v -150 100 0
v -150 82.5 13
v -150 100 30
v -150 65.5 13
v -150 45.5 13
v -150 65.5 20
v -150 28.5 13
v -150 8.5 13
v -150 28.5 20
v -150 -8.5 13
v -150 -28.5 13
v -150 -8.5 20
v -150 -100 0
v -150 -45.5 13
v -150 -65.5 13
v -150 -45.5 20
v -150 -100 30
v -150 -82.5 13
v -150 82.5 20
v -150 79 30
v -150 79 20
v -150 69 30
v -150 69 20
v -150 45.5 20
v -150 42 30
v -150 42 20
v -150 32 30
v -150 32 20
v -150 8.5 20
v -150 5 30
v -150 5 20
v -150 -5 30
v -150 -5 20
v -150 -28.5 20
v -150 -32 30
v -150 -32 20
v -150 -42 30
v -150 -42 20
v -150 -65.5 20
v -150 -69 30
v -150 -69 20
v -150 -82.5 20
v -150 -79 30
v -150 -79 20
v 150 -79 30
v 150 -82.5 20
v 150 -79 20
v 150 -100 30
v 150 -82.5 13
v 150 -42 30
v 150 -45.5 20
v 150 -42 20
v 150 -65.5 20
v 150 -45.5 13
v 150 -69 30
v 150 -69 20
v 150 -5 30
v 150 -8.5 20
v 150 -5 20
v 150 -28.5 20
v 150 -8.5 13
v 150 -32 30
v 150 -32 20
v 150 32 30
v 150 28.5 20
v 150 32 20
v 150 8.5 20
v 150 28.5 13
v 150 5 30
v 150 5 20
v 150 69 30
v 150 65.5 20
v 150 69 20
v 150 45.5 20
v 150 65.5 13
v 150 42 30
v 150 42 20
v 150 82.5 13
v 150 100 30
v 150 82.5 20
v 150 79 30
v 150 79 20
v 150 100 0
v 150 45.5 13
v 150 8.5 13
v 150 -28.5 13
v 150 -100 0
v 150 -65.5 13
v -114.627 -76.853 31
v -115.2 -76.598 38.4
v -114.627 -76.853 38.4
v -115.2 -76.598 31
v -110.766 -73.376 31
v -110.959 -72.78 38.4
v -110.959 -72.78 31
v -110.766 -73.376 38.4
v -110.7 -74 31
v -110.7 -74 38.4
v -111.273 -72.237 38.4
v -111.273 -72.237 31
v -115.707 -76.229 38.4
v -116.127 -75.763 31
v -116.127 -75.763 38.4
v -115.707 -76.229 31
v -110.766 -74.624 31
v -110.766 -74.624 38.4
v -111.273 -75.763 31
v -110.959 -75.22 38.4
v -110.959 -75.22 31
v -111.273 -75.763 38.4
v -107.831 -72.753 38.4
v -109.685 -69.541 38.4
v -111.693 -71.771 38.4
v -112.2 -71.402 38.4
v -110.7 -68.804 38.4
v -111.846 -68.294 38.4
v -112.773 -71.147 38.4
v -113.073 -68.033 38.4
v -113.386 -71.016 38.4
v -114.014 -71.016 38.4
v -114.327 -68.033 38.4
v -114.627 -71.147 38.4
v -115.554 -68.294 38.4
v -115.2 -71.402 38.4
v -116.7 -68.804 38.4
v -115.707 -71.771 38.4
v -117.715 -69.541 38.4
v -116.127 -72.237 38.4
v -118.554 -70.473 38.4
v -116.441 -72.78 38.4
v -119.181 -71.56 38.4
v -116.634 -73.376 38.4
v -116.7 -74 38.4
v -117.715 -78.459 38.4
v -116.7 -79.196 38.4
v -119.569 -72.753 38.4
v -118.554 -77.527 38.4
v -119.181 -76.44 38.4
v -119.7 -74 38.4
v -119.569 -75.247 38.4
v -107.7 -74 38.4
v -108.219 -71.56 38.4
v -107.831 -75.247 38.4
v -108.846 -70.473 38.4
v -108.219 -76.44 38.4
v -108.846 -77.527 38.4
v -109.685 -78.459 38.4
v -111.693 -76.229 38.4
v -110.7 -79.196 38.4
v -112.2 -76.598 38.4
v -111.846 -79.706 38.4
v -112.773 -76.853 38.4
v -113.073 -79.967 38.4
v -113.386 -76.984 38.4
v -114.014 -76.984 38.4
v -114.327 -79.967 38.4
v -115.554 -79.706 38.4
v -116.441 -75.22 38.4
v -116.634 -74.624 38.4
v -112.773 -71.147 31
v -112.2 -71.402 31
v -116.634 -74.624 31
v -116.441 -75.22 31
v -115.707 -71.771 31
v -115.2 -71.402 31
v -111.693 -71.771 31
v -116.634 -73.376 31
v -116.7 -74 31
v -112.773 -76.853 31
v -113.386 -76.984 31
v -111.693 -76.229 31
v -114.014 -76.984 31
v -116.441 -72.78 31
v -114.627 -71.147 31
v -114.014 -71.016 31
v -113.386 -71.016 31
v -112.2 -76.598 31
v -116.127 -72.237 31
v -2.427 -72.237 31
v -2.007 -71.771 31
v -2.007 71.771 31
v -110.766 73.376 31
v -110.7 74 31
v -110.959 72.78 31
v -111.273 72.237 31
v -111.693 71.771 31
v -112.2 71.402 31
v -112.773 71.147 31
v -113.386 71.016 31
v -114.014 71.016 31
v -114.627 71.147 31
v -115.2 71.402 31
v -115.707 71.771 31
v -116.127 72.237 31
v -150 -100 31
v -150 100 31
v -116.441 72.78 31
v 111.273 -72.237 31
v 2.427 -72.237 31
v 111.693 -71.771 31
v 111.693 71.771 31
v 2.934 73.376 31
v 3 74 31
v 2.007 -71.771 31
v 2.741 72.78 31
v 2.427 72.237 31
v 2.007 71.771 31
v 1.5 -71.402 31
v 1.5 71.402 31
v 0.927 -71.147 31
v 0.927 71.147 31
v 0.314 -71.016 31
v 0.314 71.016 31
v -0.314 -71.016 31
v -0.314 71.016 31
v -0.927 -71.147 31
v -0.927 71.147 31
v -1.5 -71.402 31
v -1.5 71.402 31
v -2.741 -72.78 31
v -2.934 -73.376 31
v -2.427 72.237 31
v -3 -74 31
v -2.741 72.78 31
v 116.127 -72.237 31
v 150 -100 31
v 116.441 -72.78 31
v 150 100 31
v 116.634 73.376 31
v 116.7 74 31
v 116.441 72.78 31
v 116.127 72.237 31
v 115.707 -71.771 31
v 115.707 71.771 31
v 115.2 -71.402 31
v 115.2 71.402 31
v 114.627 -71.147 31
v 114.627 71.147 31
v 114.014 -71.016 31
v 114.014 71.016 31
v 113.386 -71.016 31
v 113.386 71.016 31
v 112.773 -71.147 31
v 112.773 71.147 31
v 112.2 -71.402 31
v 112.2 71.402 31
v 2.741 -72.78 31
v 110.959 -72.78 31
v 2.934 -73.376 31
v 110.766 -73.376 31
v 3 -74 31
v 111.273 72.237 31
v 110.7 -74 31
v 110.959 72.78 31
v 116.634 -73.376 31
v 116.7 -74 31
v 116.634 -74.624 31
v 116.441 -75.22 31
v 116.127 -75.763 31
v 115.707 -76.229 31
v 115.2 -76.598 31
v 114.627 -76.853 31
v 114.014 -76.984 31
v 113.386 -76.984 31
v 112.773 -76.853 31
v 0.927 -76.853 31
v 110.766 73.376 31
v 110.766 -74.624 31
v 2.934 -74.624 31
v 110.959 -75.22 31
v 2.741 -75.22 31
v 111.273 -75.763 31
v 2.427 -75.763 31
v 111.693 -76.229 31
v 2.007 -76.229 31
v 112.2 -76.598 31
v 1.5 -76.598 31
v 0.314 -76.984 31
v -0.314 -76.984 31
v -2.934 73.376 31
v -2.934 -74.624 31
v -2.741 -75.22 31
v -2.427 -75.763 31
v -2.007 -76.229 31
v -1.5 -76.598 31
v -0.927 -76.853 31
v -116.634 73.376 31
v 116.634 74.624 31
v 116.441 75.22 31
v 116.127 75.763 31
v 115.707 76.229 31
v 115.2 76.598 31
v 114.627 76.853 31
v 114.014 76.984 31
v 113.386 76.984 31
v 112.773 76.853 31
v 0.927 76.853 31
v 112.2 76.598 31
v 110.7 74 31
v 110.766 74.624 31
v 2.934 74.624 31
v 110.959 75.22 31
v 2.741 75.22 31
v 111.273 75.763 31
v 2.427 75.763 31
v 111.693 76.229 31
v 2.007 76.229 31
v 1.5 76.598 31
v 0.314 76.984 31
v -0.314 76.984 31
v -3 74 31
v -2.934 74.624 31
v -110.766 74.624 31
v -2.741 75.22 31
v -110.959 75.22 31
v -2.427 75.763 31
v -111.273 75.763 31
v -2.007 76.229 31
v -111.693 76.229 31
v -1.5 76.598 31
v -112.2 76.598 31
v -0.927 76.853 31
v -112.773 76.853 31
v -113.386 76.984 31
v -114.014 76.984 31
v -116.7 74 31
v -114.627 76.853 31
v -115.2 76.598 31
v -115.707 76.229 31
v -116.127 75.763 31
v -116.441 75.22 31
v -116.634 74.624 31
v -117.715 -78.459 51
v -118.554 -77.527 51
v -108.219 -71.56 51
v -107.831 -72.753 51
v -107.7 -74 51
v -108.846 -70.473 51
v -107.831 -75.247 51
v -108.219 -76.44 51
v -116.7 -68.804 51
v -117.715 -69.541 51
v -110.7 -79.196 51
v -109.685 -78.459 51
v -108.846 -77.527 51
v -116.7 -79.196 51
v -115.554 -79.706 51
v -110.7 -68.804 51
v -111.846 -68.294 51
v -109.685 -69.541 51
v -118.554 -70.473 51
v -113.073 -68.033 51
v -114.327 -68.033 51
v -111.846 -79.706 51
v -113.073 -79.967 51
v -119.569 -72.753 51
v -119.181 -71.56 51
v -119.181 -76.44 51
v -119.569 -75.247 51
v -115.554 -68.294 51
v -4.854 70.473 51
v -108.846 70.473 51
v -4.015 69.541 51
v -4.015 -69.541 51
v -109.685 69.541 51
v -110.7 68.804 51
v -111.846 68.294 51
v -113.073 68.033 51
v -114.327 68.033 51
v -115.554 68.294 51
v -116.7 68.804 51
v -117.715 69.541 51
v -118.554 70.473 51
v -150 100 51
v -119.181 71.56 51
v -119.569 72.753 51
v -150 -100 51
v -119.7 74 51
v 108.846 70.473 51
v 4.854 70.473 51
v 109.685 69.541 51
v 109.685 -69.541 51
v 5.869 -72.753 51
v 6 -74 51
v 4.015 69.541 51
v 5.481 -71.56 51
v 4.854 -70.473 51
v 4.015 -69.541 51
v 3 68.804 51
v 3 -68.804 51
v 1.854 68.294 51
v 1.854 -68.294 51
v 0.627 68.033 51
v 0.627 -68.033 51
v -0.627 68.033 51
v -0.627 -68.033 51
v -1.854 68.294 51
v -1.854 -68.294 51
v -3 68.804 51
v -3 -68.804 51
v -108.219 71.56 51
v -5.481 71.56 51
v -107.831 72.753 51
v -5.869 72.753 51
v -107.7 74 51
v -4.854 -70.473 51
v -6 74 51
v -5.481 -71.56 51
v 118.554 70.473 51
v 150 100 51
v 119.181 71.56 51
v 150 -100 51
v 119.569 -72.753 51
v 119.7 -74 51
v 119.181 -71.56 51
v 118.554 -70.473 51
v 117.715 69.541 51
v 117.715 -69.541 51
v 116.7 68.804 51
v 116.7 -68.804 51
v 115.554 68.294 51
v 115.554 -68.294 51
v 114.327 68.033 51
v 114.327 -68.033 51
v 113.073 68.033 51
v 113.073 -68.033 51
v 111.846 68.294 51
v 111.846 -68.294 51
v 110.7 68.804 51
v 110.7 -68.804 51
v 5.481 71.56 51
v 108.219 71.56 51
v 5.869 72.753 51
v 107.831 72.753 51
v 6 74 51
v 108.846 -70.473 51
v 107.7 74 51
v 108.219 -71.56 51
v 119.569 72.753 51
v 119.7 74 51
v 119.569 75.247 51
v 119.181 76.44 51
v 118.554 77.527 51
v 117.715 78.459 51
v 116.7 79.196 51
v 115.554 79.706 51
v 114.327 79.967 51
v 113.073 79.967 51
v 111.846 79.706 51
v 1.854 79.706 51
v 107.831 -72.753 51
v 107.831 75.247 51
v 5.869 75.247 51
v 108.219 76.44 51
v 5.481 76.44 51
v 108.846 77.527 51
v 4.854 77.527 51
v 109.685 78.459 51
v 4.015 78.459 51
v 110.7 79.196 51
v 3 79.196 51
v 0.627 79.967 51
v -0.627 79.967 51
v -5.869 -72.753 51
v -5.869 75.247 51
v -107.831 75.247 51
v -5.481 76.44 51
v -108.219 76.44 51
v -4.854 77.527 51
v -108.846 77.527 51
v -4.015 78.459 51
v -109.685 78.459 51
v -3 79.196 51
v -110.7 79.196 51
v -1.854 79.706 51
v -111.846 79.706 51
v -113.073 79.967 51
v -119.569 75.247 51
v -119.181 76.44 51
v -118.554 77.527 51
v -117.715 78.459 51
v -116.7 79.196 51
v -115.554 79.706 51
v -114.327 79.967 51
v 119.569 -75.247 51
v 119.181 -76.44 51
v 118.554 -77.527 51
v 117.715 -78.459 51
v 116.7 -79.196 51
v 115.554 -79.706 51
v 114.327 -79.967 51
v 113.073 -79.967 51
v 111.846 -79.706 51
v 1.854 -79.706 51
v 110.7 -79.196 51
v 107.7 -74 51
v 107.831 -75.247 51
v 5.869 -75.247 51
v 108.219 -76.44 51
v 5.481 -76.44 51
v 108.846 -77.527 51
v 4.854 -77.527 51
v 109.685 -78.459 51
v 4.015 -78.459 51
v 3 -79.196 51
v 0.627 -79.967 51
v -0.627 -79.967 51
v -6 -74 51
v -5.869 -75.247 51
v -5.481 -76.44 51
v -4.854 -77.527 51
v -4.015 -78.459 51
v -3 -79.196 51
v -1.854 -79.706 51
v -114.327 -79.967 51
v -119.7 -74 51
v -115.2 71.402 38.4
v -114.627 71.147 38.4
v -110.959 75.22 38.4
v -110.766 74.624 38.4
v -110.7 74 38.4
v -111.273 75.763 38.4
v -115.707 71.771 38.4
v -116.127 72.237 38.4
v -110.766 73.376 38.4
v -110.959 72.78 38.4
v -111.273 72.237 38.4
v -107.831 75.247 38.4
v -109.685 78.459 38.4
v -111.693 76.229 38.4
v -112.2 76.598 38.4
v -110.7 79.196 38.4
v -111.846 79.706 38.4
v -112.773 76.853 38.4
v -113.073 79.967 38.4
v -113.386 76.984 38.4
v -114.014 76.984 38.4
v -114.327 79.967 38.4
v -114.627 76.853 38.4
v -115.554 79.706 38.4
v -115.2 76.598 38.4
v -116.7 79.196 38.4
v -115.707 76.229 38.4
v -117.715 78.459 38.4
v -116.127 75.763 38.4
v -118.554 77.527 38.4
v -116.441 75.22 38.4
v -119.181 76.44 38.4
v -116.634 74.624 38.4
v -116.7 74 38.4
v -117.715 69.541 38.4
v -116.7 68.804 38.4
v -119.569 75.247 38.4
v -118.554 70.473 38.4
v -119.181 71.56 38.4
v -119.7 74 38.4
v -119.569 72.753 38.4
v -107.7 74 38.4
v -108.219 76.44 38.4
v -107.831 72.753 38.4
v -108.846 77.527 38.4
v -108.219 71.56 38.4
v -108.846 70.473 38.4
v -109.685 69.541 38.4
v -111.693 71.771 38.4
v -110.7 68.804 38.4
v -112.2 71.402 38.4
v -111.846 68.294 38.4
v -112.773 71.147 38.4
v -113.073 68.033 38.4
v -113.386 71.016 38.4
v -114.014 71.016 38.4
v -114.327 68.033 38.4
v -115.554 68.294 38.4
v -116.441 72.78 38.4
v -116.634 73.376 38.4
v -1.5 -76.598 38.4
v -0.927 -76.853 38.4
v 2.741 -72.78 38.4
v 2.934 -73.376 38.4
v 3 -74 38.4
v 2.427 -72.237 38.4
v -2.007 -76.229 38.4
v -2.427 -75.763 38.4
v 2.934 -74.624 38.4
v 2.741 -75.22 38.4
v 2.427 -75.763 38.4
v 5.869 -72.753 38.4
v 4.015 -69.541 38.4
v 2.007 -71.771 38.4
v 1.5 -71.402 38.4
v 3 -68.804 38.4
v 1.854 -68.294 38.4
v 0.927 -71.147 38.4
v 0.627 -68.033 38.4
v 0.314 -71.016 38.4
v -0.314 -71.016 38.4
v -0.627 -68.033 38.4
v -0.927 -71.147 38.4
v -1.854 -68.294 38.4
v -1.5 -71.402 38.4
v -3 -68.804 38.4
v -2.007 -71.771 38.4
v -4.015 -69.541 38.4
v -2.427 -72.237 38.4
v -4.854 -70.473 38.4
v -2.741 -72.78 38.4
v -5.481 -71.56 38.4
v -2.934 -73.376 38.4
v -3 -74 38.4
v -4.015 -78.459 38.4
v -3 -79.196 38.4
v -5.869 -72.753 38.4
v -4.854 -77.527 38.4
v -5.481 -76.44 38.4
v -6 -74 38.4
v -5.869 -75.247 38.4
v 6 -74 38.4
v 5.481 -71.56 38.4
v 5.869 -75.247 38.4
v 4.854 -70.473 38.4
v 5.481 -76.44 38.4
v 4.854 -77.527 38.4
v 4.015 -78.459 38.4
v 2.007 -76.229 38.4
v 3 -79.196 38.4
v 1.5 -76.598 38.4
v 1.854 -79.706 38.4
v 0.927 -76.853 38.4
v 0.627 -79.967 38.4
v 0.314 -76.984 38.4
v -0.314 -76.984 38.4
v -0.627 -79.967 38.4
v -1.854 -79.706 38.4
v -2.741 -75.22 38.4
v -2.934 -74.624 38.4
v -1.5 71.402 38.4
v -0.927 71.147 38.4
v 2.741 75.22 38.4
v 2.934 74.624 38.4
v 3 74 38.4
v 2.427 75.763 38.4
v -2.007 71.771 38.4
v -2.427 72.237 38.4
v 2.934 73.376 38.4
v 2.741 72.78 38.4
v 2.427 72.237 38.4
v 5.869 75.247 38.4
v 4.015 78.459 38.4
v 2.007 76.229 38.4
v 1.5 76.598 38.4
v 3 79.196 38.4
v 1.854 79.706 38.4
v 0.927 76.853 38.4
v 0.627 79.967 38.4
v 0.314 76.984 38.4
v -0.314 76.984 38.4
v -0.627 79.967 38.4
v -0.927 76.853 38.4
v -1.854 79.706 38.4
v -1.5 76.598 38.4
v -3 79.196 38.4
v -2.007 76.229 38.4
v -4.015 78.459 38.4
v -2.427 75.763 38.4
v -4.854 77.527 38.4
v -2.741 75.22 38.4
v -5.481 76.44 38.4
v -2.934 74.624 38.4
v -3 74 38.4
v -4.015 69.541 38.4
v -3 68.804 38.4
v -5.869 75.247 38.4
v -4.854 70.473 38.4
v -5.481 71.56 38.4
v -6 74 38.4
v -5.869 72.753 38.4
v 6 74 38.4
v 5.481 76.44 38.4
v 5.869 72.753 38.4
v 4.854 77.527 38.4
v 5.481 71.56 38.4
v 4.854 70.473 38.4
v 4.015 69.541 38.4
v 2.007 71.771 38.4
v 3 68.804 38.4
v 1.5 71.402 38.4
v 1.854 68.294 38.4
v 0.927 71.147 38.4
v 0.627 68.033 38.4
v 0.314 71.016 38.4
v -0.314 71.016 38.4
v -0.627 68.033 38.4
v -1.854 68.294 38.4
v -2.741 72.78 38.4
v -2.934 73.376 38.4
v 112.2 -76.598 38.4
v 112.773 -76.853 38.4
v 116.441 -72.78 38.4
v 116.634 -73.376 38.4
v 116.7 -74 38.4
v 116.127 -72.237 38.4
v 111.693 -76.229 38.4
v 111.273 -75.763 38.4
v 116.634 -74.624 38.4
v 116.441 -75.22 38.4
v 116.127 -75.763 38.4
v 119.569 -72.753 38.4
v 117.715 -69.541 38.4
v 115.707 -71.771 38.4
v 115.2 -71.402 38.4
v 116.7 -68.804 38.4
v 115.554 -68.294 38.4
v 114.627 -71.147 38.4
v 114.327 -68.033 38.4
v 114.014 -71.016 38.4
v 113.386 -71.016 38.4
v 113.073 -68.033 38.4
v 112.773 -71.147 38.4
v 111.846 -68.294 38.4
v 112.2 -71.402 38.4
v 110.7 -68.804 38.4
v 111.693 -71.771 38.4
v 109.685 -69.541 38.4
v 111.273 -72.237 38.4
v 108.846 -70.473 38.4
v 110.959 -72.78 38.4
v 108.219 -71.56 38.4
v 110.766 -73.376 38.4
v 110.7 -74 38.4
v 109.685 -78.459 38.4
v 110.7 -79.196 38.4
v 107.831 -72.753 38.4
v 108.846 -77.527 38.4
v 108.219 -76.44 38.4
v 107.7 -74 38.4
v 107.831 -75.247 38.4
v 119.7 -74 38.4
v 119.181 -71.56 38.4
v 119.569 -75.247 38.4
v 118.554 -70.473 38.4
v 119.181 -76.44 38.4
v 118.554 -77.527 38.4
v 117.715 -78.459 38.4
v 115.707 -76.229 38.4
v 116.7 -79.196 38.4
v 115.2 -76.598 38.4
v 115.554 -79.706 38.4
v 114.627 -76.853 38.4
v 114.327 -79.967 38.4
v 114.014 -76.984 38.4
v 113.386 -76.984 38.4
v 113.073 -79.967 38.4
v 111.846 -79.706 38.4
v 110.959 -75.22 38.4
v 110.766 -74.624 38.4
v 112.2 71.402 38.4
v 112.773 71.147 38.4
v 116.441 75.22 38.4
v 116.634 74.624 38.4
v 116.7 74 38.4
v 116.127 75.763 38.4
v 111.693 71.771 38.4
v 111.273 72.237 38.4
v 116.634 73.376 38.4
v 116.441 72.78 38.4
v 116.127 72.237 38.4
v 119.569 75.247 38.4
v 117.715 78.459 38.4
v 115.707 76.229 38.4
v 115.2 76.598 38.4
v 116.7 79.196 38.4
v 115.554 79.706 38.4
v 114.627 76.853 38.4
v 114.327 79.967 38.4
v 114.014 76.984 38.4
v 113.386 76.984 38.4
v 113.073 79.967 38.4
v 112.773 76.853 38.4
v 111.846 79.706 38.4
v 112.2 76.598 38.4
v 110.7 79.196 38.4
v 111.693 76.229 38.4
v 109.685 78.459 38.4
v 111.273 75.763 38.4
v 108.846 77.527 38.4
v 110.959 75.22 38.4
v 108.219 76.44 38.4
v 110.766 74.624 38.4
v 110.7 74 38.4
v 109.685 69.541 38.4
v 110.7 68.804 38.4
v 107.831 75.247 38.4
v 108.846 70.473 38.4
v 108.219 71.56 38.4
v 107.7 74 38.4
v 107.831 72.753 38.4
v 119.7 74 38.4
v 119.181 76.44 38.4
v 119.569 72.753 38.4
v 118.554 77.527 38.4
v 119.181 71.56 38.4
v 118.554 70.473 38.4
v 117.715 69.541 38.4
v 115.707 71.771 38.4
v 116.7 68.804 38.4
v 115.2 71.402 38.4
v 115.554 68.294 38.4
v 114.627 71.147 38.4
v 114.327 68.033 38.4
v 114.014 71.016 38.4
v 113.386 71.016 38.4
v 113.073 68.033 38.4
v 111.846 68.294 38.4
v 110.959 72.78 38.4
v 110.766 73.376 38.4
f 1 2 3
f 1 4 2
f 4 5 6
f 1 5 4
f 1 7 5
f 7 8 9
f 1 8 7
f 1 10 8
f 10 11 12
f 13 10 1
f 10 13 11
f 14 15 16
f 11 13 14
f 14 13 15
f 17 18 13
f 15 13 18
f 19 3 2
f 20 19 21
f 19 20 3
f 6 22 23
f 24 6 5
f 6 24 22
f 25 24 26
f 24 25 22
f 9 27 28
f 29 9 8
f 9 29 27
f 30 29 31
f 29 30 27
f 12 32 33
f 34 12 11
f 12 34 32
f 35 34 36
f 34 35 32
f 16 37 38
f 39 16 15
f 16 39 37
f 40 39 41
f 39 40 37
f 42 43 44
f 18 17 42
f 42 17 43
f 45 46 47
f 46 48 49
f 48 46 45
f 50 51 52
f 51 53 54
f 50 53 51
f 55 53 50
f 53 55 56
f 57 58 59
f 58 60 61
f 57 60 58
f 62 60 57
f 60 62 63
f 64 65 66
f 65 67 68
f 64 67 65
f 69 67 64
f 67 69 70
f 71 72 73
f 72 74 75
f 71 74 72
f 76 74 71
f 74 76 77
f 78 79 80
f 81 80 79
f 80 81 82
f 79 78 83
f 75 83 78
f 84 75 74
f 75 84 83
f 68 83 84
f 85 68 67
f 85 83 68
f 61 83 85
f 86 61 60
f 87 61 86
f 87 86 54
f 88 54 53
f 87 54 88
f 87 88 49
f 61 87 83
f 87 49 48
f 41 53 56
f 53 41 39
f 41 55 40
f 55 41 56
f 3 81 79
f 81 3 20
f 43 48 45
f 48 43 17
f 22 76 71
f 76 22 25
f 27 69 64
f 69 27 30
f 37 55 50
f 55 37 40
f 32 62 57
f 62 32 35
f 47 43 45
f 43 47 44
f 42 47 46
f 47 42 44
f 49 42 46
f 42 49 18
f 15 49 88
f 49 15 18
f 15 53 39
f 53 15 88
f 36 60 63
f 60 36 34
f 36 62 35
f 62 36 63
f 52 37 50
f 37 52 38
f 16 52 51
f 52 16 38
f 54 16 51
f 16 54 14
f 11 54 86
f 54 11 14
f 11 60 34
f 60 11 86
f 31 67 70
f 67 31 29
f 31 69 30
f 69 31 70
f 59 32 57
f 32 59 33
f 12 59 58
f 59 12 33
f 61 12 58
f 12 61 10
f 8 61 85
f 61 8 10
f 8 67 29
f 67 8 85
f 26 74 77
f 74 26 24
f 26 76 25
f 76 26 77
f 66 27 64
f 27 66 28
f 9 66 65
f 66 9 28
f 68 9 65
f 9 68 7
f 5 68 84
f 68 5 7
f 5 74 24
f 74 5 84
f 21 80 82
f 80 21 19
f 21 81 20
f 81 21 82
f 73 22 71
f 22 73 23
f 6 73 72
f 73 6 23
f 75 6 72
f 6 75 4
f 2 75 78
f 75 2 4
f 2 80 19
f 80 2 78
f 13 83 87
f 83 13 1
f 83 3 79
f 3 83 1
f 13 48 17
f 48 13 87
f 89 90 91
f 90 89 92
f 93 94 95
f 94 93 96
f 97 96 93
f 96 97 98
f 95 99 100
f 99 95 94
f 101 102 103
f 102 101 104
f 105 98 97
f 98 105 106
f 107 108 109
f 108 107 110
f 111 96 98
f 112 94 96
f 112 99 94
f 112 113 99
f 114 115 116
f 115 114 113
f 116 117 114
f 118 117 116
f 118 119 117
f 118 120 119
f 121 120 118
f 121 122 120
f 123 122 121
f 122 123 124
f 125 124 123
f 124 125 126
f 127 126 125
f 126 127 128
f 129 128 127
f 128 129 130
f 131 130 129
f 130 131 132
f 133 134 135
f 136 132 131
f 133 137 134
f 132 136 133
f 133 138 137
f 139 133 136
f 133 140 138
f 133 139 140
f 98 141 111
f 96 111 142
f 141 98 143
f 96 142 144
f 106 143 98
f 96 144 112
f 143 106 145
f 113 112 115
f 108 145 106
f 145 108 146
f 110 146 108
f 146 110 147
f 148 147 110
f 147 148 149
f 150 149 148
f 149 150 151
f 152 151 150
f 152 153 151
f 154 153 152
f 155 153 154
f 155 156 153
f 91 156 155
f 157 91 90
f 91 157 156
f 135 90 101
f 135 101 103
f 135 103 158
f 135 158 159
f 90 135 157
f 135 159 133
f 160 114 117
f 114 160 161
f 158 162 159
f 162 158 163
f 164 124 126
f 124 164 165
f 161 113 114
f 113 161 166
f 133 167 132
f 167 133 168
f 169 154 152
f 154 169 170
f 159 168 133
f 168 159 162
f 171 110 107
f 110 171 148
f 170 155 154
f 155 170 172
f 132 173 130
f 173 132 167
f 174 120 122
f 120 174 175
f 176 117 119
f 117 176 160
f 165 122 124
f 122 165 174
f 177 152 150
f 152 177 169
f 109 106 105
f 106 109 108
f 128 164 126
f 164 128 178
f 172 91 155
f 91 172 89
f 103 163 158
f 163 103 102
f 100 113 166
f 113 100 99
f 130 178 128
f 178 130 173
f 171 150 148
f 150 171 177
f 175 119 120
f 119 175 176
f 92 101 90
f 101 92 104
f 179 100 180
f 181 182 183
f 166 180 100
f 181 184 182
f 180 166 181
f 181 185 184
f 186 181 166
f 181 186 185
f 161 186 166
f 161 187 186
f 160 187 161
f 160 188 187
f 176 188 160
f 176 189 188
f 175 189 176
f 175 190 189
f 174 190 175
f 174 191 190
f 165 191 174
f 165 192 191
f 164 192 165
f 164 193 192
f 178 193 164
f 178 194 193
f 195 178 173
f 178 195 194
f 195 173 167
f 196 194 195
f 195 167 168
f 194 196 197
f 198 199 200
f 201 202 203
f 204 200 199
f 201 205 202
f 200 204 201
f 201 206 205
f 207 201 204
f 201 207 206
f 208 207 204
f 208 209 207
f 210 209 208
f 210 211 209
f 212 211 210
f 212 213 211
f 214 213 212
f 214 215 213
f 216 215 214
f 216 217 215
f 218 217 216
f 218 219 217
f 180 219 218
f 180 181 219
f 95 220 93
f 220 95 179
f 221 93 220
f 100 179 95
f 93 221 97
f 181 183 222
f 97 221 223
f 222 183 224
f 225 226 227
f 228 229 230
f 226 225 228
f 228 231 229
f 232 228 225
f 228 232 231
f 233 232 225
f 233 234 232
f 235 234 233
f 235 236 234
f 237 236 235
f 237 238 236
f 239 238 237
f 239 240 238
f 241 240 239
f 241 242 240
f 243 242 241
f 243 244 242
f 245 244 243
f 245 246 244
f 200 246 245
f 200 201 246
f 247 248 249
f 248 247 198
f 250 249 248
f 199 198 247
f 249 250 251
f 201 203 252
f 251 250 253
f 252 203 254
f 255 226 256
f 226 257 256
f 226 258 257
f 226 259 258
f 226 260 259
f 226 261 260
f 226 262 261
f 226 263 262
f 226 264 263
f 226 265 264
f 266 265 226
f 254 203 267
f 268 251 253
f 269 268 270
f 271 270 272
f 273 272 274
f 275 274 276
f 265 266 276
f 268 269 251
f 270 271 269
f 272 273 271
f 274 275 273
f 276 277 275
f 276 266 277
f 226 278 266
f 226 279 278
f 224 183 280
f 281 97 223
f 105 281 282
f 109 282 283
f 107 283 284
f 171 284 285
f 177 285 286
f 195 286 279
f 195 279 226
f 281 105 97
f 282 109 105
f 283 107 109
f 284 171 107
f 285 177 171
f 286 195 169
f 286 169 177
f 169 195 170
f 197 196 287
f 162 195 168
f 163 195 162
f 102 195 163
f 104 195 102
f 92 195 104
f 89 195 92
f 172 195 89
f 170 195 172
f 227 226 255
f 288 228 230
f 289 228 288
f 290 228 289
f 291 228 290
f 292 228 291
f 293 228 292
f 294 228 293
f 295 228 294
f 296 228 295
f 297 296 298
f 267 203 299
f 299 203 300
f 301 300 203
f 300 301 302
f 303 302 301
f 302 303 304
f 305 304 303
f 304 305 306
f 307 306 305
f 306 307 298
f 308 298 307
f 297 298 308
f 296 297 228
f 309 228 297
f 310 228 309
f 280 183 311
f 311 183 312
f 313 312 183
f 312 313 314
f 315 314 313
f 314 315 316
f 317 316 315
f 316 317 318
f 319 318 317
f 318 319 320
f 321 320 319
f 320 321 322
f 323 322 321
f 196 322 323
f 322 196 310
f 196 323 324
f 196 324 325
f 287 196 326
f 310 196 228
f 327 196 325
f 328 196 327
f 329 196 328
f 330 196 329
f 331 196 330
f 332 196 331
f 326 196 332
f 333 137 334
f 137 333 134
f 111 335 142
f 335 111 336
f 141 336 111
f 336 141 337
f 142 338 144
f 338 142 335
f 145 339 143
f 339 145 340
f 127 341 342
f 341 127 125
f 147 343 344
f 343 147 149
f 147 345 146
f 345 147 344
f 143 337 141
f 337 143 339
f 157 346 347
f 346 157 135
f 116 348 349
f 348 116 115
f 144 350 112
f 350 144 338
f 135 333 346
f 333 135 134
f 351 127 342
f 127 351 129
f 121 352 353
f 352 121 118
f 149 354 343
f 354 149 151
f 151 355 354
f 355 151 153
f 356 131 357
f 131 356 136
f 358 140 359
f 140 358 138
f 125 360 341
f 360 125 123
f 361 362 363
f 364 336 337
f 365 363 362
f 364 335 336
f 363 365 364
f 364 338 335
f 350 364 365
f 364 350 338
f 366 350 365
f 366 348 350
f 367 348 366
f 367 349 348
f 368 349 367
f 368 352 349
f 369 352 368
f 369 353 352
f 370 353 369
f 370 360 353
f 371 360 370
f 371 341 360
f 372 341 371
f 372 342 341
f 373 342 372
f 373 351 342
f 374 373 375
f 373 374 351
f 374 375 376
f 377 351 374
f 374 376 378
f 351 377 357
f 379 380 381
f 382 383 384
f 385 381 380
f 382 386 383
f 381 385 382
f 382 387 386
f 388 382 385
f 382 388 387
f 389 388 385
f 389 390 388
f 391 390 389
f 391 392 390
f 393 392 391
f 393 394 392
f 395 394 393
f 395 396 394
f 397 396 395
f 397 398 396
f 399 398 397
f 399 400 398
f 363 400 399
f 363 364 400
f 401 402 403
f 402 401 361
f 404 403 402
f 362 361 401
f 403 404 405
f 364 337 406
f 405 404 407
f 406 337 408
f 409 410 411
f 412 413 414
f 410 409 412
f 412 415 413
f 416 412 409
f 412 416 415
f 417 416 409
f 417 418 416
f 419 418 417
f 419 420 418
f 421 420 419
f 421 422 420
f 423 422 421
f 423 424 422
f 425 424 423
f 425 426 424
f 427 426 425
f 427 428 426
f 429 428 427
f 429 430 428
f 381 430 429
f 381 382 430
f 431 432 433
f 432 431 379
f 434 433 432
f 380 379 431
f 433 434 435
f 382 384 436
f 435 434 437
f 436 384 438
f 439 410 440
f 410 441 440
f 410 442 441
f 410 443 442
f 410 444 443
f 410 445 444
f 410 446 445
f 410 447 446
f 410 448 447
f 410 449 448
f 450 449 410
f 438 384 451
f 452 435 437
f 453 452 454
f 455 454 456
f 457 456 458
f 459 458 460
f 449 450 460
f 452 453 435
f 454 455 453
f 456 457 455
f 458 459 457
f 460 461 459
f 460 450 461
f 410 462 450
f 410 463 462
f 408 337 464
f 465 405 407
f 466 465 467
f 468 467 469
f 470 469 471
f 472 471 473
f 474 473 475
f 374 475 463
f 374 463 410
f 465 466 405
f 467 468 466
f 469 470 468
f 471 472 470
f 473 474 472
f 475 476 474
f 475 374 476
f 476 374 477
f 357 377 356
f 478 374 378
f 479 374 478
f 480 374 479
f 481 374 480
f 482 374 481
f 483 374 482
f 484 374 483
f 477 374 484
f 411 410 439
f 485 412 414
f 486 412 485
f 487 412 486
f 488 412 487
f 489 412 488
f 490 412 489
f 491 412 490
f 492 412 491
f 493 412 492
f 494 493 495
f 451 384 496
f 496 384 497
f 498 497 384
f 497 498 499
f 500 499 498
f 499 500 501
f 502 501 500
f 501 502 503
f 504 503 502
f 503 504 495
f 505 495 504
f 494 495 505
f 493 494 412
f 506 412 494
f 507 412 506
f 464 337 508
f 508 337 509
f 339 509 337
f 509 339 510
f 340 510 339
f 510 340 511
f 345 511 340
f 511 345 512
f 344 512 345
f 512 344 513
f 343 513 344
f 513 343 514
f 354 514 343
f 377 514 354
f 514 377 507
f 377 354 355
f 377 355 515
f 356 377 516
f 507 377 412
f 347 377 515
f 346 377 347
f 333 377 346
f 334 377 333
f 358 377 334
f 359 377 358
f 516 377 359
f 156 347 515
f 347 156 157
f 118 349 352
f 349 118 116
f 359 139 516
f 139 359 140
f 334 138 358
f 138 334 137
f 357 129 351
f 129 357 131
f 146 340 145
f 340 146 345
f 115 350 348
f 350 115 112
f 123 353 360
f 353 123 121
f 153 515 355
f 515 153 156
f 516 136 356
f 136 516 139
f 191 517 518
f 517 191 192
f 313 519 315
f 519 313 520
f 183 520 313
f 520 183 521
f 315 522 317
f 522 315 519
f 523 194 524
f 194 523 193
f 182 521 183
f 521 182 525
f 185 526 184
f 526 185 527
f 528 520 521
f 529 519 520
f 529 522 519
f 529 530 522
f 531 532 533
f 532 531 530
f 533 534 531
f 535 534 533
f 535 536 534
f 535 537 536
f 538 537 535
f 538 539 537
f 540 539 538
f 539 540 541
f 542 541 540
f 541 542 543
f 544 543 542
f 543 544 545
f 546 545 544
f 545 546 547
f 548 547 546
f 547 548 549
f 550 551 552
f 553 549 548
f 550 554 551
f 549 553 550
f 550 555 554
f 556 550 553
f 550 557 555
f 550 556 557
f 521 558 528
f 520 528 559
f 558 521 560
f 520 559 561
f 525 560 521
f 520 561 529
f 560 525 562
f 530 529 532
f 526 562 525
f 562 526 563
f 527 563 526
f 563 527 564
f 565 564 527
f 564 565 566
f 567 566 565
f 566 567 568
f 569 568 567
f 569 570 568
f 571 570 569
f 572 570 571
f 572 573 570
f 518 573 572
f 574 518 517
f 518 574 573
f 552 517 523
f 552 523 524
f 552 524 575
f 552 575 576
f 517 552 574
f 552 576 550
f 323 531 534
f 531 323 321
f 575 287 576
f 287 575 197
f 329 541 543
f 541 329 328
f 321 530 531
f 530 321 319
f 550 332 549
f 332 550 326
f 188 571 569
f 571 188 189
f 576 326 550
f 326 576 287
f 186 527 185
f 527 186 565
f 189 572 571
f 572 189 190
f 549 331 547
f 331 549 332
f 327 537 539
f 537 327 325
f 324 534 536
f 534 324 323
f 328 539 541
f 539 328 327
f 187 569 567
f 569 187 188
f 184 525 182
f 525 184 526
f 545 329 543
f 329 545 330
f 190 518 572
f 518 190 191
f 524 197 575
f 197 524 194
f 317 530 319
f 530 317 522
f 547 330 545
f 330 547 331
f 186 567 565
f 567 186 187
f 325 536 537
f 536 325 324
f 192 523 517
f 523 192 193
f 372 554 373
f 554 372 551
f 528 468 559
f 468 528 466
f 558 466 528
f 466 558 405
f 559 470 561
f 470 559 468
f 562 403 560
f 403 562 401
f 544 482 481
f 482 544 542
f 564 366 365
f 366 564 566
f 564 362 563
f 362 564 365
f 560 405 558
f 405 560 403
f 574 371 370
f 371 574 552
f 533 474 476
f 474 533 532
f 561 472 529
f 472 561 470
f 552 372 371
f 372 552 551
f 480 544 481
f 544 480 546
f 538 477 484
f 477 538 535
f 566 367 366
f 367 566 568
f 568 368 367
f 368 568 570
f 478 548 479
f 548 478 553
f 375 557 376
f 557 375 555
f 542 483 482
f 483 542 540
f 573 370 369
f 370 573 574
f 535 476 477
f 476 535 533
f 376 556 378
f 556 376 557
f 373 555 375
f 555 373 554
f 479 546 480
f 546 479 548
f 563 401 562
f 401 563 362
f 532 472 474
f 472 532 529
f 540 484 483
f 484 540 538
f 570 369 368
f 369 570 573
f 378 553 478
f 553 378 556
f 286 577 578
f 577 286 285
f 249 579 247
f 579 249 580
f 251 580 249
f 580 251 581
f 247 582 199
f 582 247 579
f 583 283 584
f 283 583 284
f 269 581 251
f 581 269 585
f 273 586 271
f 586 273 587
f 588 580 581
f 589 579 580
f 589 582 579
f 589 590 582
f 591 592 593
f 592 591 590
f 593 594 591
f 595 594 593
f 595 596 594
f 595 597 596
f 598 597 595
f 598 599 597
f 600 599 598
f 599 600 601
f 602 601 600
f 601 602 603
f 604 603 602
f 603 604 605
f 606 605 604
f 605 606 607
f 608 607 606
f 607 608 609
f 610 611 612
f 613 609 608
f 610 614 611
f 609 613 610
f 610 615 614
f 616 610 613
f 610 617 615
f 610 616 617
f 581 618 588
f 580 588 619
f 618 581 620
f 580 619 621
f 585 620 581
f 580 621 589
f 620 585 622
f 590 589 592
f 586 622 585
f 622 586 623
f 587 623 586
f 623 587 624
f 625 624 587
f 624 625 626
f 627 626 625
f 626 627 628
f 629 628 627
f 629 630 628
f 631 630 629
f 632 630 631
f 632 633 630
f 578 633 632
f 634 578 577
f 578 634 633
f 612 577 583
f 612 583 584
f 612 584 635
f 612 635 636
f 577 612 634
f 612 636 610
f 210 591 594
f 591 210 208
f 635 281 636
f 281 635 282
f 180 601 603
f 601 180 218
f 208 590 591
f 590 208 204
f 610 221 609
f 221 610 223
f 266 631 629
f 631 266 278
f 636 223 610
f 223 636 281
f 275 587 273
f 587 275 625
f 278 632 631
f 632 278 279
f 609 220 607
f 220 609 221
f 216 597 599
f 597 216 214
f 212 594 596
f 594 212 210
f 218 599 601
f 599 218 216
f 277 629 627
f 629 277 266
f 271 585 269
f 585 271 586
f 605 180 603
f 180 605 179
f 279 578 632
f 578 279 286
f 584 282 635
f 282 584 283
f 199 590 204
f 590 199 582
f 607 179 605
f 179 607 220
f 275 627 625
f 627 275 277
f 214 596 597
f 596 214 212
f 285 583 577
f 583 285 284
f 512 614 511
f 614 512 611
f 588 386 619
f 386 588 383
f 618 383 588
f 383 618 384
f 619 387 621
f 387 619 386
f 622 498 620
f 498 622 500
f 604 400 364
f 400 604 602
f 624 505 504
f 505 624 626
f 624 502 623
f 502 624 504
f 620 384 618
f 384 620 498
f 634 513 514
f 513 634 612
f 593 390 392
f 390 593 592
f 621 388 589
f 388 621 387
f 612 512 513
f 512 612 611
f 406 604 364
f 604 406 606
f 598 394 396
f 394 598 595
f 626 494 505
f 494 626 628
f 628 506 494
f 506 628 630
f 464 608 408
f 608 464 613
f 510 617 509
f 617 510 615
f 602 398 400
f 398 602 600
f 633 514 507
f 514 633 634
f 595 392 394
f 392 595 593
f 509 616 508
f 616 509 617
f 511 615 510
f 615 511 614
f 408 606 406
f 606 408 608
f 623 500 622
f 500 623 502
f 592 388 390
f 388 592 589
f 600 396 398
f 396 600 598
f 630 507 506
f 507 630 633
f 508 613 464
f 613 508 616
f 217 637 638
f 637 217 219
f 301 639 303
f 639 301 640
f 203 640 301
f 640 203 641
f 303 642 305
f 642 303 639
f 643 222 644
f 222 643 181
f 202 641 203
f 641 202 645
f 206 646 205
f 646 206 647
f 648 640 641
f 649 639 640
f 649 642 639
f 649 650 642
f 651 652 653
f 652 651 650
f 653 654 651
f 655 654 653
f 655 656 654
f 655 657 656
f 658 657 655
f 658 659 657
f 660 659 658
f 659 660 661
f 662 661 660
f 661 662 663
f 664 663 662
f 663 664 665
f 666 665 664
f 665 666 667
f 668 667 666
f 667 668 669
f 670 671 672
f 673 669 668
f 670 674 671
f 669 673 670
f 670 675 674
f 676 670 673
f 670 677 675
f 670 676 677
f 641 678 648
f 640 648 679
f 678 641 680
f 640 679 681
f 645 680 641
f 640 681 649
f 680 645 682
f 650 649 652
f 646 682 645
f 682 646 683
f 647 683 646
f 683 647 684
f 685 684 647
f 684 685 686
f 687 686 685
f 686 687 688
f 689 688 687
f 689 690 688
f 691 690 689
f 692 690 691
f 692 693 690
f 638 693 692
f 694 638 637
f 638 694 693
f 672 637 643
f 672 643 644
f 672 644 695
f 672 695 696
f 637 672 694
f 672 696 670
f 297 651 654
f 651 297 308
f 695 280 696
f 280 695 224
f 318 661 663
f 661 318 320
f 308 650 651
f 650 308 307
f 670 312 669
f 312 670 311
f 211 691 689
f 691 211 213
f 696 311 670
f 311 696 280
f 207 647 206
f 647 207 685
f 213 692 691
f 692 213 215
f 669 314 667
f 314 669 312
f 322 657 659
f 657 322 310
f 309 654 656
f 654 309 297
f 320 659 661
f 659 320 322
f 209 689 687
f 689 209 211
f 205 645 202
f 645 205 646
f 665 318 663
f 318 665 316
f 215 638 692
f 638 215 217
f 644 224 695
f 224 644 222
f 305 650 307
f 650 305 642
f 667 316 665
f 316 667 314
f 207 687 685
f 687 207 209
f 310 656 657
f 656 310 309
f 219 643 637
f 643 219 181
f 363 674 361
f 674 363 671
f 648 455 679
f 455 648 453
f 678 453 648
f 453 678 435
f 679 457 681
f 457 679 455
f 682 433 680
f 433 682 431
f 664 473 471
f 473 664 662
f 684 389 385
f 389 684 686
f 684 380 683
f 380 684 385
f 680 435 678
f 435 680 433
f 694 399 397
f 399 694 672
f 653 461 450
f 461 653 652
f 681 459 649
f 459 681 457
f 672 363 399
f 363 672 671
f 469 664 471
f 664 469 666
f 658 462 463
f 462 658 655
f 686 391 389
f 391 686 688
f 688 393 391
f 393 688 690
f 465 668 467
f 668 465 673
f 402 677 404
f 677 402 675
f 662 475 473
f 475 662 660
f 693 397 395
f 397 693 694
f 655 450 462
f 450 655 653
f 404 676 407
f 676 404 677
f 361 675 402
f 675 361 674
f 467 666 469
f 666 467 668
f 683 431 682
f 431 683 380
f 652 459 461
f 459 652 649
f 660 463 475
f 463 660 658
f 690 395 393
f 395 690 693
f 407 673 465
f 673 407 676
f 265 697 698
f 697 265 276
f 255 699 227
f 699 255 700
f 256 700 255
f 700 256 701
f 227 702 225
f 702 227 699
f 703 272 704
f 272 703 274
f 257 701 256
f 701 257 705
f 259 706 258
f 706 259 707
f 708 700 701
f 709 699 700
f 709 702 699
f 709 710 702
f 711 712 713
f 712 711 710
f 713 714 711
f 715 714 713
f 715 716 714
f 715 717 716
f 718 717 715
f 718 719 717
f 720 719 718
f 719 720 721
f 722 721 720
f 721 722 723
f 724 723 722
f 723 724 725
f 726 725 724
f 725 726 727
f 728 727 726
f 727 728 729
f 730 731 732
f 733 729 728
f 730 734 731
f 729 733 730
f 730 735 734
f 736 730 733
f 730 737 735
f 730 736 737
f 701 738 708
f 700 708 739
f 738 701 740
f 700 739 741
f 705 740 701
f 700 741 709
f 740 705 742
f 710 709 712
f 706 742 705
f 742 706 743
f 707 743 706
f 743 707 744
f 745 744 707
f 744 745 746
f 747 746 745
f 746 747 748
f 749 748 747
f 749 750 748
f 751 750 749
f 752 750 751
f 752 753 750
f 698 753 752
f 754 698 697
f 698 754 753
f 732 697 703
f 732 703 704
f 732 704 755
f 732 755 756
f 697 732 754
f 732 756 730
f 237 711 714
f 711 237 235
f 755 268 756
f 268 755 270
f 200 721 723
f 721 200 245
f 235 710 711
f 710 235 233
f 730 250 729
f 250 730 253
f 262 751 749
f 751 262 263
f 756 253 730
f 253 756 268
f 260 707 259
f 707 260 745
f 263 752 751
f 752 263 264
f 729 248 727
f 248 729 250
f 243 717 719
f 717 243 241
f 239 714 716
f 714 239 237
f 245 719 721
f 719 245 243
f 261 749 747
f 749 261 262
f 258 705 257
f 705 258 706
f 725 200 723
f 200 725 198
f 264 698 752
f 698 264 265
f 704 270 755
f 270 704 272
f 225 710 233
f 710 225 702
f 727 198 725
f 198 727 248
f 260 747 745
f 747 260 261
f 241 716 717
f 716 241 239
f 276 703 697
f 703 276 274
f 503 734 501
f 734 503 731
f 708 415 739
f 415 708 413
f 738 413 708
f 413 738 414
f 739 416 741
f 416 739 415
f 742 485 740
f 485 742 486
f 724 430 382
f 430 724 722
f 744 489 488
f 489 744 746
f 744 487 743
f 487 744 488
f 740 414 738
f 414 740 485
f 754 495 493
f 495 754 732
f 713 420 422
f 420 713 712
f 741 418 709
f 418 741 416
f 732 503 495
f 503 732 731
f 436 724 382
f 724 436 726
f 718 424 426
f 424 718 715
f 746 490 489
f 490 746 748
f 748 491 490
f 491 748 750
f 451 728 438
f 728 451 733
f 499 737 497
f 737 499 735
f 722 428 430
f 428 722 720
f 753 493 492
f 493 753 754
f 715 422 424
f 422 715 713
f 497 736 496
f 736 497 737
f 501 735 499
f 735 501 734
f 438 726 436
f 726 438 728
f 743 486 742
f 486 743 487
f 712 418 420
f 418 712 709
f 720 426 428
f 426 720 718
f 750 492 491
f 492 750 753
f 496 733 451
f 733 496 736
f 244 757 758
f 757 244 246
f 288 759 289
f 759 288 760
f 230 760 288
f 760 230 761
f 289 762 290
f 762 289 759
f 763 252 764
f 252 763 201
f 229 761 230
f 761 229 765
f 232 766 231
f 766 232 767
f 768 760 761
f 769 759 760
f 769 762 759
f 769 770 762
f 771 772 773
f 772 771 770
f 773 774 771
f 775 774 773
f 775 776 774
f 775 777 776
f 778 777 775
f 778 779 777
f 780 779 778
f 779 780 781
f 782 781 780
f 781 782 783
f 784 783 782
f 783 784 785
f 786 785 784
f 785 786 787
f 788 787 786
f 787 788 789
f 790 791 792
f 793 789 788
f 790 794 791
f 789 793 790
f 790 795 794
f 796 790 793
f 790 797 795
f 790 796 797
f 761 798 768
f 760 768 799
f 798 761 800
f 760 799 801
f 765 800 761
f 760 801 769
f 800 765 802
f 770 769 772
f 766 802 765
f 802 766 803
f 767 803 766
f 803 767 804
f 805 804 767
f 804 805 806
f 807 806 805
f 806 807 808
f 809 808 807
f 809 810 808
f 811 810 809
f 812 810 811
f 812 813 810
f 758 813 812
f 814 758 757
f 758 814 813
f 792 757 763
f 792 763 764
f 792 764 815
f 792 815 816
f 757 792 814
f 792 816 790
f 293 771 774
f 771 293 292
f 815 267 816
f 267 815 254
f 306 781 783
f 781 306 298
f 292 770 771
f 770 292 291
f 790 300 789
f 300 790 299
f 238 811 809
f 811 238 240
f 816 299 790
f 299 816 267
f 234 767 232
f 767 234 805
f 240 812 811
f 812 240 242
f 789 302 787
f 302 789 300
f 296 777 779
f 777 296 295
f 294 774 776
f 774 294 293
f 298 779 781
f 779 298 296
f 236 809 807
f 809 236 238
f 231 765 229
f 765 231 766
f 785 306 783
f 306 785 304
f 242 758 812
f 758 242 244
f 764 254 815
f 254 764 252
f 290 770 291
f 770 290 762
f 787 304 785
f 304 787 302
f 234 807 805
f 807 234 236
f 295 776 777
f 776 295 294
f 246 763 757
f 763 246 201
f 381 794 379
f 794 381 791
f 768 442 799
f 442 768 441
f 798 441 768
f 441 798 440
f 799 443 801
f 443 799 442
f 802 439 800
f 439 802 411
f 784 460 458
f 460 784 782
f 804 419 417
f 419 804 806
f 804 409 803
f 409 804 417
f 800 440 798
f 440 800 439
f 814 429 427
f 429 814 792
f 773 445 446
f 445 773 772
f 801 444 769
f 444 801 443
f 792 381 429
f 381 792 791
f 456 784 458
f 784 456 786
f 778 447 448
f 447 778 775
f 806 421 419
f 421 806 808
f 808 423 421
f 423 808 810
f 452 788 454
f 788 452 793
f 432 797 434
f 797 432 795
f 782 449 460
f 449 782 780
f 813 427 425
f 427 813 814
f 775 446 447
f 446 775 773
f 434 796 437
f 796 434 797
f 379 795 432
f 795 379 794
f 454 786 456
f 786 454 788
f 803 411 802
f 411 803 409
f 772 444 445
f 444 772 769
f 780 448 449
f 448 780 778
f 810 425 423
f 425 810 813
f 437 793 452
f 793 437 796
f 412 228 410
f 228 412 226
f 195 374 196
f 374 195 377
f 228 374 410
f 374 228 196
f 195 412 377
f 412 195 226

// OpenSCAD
// file: util.scad
// This function calculates the offset required to center equally spaced spaced series of "n objects. The objects have a length "x" and gap "g" between neighbouring objects. "l" is the length of the reference line.
function linearOffset (l, n, x, g) = (l - (n*x + (n-1)*g)) / 2;

// Calculating gaps between equally a series of equidistant objects of length "x" spanning across a reference line "l". There is an offset "o" at each side of the reference line.
function linearGap (l, n, x, o) = (l - 2*o - n*x) / (n - 1);
// file: variables.scad
include<util.scad>

$fn=30;


///////////////
// Wasteboard//
///////////////

clr = 8; // No metal area

// Mounting holes to the T slot worktop
// M6 nuts with TX30 heads are used. Adjust M_d2 and M_k as it might be different. 

M_pitch = 1;   // Pitch size (mm)
M_nd = 6.0;    // Nominal diameter (mm)
M_cd = 6.6;    // Clearance drill diameter (mm)
M_td = 5.0;    // Tap drill diameter (mm)

M_d2 = 12;     // Max bolt head diameter (mm)
M_k = 4.6;     // Max bolt head height (mm)


// Mounting holes for tool holders
// T-nut dimensions with M4 thread

tn_ch = 7;     // Cylinder height 
tn_cd = 5;     // Cylinder external diameter
tn_shh = 0.8;  // Shoulder height
tn_shd = 15;   // Shoulder diameter

wbh = 20; // Wasteboard height
mbh = wbh - (clr + M_k); // Minimum board height.
// file: modules.scad
include <variables.scad>

// Basic primitive for the worktop
module aluStock(l, w, h) {
    cube([l, w, h]);
}

// Assembling parts of the worktop
module carveyWorktop(l, w, h, n, g, tSlotOffset, tSlotDim ) {
    // Calculate the shift of the T-slots in the Y direction
    ytrans = tSlotOffset;
    // Calculate the height difference of the T-slot profile and the stock. 
    ztrans = h - (tSlotDim[1]+tSlotDim[3]);
    // Cutting the T-slot groves out of the stock
    translate([-l/2, -w/2, 0])
        difference() {
            aluStock(l, w, h);
            // Move extrusion up to stock surface and centre it along the Y direction
            translate([0, ytrans, ztrans])
                for (i = [0 : n - 1]) {
                    translate([0, i * (g + tSlotDim[0]), 0])
                        tSlotExtrusion(tSlotDim,l);                        
                }
       }
}

module tSlotExtrusion(dim,l){
/*
dim = [a, b, c, d]
    
a = headspace width
b = headspace depth
c = throat width
d = throat depth

Cut section diagram of the T-slot. 

+------------+     +-------------+
|            |     |   Λ         |
|            |<-e->|   |         |
|            |     |   d         |
|            |     |   |         |
|            |     |   V         |
|     +------+     +------+ ---  |
|     |                   |   Λ  |
|     |                   |   |  |
|     |                   |   b  |
|     |<--------a-------->|   |  |
|     |                   |   V  |
|     +-------------------+ ---  |
|                                |
+--------------------------------+


*/

    tSlotProfilePoints = [
        [0,                  0],
        [dim[0],             0],
        [dim[0],             dim[1]],
        [(dim[0]+dim[2])/2,  dim[1]],
        [(dim[0]+dim[2])/2,  dim[1]+dim[3]],
        [(dim[0]-dim[2])/2,  dim[1]+dim[3]],
        [(dim[0]-dim[2])/2,  dim[1]],
        [0,                  dim[1]]
        ];
    rotate([90, 0, 90]) {
        linear_extrude(l) {
            polygon(points = tSlotProfilePoints);
        }
    }
}

////////////////////
//// Wasteboard ////
////////////////////

module wasteBoard(l, w, h, mhVar, mhDim, tnhDim){
    // Finding the largest diameter of the mounting holes
    D = (mhDim[1] > mhDim[3]) ? mhDim[1] : mhDim[3];
    // Calculating the offset needed to center the mounting holes above the T-slots  
    mh_align =(mhVar[4] - D) / 2;
    // Gap between mounting holes along the X axis that allow the wasteboard to be fastened to the worktop
    gx = linearGap(l, mhVar[0], D, mhVar[2]);
    // Gap between mounting holes along the Y axis
    gy = linearGap(w, mhVar[1], mhVar[4], mhVar[3]);
    // Centering along the X and Y axes.
    translate([-l/2, -w/2, 0])
        difference() {
            mdfStock(l, w, h);
            //
            // Mounting holes
            //
            // Align the first hole body to be in x and y positive quadrant and applying offsets
            translate([D/2 + mhVar[2], D/2 + mhVar[3], 0])
            // Create the array of mounting holes
                for (i = [0 : mhVar[0] - 1]) {
                    for (j = [0 : mhVar[1] - 1]) {
                        if (mhVar[5] == true) {
                            if (j == 0 || j == mhVar[1] - 1) {
                                translate([i * (gx + D), j * (gy + mhVar[4]) + mh_align, 0])
                                dualDHole(mhDim);
                            } else{
                            }
                        } else {
                            translate([i * (gx + D), j * (gy + mhVar[4]) + mh_align, 0])
                            dualDHole(mhDim);
                        }
                    }   
                }
            //
            // T-nut holes
            //

        }

}

module mdfStock(l, w, h){
    cube([l,w,h]);
}

module tNutHole(){
    dualDHole(tn_shd,tn_shh,tn_cd,wbh-tn_shh);
}

// The second cylinder is on top of the first.
module dualDHole(dim){

// dim = [ d1, h1, d2, h2]
    cylinder(h=dim[1],d=dim[0]);
    translate([0,0,dim[1]])
        cylinder(h=dim[3],d=dim[2]);
}
// main file
include<modules.scad>

///////////////////////////
//// Customisable menu ////
///////////////////////////

/* [Worktop] */

// Worktop length (mm)
wtl = 300;
// Worktop width (mm)
wtw = 200;
// Worktop height (mm)
wth = 30;

/* [T-slot] */

// Number of slots
n_slots = 5;
// Headspace width (mm)
hsw = 17; //// [16:0.1:18] 
// Headspace depth (mm)
hsd = 7; //// [7:0.1:8]
// Throat width (mm)
thw = 10; //// [10:10]
// Throat depth (mm)
thd = 10; //// [9:1:14]
// Gap between slots (mm)
tsg = 20;

/* [Wasteboard] */

// Wasteboard length (mm)
wbl = wtl;
// Wasteboard width (mm)
wbw = wtw;
// Wasteboard height (mm)
wbh = 20;
// Mounting holes count in X dir
mh_xn = 3; // [2:5]
// Mounting hole count in Y dir
mh_yn = 5; //// [2:2]
// Plot mounting holes only above outer T-slots
outerRowsOnly = true;
// Mounting hole X offset
mhx_offset = 30;



//////////////////////////////
//// Calculated variables ////
//////////////////////////////

//Worktop
//
// T-slot dimensions
groveDim = [hsw, hsd, thw, thd]; 
// Offset value used to centre the T-slots
tso = linearOffset(wtw, n_slots, hsw, tsg);

// Wasteboard
//
// Mounting hole "Y" offset
mhy_offset = tso;

// Mounting hole variables
mountingHoleVar = [mh_xn, mh_yn, mhx_offset, mhy_offset, hsw, outerRowsOnly];

// Mounting hole dimensions
mountingHoleDim = [M_nd, mbh, M_d2, clr+M_k];

// T-nut hole dimensions
tNutHoleDim = [tn_shd, tn_shh, tn_cd, wbh-tn_shh]; 

//////////////////////////////
//// Generating models    ////
//////////////////////////////

carveyWorktop(wtl, wtw, wth, n_slots, tsg, tso, groveDim);

translate([0,0,wth+1])
    wasteBoard(wbl, wbw, wbh, mountingHoleVar, mountingHoleDim, tNutHoleDim);
